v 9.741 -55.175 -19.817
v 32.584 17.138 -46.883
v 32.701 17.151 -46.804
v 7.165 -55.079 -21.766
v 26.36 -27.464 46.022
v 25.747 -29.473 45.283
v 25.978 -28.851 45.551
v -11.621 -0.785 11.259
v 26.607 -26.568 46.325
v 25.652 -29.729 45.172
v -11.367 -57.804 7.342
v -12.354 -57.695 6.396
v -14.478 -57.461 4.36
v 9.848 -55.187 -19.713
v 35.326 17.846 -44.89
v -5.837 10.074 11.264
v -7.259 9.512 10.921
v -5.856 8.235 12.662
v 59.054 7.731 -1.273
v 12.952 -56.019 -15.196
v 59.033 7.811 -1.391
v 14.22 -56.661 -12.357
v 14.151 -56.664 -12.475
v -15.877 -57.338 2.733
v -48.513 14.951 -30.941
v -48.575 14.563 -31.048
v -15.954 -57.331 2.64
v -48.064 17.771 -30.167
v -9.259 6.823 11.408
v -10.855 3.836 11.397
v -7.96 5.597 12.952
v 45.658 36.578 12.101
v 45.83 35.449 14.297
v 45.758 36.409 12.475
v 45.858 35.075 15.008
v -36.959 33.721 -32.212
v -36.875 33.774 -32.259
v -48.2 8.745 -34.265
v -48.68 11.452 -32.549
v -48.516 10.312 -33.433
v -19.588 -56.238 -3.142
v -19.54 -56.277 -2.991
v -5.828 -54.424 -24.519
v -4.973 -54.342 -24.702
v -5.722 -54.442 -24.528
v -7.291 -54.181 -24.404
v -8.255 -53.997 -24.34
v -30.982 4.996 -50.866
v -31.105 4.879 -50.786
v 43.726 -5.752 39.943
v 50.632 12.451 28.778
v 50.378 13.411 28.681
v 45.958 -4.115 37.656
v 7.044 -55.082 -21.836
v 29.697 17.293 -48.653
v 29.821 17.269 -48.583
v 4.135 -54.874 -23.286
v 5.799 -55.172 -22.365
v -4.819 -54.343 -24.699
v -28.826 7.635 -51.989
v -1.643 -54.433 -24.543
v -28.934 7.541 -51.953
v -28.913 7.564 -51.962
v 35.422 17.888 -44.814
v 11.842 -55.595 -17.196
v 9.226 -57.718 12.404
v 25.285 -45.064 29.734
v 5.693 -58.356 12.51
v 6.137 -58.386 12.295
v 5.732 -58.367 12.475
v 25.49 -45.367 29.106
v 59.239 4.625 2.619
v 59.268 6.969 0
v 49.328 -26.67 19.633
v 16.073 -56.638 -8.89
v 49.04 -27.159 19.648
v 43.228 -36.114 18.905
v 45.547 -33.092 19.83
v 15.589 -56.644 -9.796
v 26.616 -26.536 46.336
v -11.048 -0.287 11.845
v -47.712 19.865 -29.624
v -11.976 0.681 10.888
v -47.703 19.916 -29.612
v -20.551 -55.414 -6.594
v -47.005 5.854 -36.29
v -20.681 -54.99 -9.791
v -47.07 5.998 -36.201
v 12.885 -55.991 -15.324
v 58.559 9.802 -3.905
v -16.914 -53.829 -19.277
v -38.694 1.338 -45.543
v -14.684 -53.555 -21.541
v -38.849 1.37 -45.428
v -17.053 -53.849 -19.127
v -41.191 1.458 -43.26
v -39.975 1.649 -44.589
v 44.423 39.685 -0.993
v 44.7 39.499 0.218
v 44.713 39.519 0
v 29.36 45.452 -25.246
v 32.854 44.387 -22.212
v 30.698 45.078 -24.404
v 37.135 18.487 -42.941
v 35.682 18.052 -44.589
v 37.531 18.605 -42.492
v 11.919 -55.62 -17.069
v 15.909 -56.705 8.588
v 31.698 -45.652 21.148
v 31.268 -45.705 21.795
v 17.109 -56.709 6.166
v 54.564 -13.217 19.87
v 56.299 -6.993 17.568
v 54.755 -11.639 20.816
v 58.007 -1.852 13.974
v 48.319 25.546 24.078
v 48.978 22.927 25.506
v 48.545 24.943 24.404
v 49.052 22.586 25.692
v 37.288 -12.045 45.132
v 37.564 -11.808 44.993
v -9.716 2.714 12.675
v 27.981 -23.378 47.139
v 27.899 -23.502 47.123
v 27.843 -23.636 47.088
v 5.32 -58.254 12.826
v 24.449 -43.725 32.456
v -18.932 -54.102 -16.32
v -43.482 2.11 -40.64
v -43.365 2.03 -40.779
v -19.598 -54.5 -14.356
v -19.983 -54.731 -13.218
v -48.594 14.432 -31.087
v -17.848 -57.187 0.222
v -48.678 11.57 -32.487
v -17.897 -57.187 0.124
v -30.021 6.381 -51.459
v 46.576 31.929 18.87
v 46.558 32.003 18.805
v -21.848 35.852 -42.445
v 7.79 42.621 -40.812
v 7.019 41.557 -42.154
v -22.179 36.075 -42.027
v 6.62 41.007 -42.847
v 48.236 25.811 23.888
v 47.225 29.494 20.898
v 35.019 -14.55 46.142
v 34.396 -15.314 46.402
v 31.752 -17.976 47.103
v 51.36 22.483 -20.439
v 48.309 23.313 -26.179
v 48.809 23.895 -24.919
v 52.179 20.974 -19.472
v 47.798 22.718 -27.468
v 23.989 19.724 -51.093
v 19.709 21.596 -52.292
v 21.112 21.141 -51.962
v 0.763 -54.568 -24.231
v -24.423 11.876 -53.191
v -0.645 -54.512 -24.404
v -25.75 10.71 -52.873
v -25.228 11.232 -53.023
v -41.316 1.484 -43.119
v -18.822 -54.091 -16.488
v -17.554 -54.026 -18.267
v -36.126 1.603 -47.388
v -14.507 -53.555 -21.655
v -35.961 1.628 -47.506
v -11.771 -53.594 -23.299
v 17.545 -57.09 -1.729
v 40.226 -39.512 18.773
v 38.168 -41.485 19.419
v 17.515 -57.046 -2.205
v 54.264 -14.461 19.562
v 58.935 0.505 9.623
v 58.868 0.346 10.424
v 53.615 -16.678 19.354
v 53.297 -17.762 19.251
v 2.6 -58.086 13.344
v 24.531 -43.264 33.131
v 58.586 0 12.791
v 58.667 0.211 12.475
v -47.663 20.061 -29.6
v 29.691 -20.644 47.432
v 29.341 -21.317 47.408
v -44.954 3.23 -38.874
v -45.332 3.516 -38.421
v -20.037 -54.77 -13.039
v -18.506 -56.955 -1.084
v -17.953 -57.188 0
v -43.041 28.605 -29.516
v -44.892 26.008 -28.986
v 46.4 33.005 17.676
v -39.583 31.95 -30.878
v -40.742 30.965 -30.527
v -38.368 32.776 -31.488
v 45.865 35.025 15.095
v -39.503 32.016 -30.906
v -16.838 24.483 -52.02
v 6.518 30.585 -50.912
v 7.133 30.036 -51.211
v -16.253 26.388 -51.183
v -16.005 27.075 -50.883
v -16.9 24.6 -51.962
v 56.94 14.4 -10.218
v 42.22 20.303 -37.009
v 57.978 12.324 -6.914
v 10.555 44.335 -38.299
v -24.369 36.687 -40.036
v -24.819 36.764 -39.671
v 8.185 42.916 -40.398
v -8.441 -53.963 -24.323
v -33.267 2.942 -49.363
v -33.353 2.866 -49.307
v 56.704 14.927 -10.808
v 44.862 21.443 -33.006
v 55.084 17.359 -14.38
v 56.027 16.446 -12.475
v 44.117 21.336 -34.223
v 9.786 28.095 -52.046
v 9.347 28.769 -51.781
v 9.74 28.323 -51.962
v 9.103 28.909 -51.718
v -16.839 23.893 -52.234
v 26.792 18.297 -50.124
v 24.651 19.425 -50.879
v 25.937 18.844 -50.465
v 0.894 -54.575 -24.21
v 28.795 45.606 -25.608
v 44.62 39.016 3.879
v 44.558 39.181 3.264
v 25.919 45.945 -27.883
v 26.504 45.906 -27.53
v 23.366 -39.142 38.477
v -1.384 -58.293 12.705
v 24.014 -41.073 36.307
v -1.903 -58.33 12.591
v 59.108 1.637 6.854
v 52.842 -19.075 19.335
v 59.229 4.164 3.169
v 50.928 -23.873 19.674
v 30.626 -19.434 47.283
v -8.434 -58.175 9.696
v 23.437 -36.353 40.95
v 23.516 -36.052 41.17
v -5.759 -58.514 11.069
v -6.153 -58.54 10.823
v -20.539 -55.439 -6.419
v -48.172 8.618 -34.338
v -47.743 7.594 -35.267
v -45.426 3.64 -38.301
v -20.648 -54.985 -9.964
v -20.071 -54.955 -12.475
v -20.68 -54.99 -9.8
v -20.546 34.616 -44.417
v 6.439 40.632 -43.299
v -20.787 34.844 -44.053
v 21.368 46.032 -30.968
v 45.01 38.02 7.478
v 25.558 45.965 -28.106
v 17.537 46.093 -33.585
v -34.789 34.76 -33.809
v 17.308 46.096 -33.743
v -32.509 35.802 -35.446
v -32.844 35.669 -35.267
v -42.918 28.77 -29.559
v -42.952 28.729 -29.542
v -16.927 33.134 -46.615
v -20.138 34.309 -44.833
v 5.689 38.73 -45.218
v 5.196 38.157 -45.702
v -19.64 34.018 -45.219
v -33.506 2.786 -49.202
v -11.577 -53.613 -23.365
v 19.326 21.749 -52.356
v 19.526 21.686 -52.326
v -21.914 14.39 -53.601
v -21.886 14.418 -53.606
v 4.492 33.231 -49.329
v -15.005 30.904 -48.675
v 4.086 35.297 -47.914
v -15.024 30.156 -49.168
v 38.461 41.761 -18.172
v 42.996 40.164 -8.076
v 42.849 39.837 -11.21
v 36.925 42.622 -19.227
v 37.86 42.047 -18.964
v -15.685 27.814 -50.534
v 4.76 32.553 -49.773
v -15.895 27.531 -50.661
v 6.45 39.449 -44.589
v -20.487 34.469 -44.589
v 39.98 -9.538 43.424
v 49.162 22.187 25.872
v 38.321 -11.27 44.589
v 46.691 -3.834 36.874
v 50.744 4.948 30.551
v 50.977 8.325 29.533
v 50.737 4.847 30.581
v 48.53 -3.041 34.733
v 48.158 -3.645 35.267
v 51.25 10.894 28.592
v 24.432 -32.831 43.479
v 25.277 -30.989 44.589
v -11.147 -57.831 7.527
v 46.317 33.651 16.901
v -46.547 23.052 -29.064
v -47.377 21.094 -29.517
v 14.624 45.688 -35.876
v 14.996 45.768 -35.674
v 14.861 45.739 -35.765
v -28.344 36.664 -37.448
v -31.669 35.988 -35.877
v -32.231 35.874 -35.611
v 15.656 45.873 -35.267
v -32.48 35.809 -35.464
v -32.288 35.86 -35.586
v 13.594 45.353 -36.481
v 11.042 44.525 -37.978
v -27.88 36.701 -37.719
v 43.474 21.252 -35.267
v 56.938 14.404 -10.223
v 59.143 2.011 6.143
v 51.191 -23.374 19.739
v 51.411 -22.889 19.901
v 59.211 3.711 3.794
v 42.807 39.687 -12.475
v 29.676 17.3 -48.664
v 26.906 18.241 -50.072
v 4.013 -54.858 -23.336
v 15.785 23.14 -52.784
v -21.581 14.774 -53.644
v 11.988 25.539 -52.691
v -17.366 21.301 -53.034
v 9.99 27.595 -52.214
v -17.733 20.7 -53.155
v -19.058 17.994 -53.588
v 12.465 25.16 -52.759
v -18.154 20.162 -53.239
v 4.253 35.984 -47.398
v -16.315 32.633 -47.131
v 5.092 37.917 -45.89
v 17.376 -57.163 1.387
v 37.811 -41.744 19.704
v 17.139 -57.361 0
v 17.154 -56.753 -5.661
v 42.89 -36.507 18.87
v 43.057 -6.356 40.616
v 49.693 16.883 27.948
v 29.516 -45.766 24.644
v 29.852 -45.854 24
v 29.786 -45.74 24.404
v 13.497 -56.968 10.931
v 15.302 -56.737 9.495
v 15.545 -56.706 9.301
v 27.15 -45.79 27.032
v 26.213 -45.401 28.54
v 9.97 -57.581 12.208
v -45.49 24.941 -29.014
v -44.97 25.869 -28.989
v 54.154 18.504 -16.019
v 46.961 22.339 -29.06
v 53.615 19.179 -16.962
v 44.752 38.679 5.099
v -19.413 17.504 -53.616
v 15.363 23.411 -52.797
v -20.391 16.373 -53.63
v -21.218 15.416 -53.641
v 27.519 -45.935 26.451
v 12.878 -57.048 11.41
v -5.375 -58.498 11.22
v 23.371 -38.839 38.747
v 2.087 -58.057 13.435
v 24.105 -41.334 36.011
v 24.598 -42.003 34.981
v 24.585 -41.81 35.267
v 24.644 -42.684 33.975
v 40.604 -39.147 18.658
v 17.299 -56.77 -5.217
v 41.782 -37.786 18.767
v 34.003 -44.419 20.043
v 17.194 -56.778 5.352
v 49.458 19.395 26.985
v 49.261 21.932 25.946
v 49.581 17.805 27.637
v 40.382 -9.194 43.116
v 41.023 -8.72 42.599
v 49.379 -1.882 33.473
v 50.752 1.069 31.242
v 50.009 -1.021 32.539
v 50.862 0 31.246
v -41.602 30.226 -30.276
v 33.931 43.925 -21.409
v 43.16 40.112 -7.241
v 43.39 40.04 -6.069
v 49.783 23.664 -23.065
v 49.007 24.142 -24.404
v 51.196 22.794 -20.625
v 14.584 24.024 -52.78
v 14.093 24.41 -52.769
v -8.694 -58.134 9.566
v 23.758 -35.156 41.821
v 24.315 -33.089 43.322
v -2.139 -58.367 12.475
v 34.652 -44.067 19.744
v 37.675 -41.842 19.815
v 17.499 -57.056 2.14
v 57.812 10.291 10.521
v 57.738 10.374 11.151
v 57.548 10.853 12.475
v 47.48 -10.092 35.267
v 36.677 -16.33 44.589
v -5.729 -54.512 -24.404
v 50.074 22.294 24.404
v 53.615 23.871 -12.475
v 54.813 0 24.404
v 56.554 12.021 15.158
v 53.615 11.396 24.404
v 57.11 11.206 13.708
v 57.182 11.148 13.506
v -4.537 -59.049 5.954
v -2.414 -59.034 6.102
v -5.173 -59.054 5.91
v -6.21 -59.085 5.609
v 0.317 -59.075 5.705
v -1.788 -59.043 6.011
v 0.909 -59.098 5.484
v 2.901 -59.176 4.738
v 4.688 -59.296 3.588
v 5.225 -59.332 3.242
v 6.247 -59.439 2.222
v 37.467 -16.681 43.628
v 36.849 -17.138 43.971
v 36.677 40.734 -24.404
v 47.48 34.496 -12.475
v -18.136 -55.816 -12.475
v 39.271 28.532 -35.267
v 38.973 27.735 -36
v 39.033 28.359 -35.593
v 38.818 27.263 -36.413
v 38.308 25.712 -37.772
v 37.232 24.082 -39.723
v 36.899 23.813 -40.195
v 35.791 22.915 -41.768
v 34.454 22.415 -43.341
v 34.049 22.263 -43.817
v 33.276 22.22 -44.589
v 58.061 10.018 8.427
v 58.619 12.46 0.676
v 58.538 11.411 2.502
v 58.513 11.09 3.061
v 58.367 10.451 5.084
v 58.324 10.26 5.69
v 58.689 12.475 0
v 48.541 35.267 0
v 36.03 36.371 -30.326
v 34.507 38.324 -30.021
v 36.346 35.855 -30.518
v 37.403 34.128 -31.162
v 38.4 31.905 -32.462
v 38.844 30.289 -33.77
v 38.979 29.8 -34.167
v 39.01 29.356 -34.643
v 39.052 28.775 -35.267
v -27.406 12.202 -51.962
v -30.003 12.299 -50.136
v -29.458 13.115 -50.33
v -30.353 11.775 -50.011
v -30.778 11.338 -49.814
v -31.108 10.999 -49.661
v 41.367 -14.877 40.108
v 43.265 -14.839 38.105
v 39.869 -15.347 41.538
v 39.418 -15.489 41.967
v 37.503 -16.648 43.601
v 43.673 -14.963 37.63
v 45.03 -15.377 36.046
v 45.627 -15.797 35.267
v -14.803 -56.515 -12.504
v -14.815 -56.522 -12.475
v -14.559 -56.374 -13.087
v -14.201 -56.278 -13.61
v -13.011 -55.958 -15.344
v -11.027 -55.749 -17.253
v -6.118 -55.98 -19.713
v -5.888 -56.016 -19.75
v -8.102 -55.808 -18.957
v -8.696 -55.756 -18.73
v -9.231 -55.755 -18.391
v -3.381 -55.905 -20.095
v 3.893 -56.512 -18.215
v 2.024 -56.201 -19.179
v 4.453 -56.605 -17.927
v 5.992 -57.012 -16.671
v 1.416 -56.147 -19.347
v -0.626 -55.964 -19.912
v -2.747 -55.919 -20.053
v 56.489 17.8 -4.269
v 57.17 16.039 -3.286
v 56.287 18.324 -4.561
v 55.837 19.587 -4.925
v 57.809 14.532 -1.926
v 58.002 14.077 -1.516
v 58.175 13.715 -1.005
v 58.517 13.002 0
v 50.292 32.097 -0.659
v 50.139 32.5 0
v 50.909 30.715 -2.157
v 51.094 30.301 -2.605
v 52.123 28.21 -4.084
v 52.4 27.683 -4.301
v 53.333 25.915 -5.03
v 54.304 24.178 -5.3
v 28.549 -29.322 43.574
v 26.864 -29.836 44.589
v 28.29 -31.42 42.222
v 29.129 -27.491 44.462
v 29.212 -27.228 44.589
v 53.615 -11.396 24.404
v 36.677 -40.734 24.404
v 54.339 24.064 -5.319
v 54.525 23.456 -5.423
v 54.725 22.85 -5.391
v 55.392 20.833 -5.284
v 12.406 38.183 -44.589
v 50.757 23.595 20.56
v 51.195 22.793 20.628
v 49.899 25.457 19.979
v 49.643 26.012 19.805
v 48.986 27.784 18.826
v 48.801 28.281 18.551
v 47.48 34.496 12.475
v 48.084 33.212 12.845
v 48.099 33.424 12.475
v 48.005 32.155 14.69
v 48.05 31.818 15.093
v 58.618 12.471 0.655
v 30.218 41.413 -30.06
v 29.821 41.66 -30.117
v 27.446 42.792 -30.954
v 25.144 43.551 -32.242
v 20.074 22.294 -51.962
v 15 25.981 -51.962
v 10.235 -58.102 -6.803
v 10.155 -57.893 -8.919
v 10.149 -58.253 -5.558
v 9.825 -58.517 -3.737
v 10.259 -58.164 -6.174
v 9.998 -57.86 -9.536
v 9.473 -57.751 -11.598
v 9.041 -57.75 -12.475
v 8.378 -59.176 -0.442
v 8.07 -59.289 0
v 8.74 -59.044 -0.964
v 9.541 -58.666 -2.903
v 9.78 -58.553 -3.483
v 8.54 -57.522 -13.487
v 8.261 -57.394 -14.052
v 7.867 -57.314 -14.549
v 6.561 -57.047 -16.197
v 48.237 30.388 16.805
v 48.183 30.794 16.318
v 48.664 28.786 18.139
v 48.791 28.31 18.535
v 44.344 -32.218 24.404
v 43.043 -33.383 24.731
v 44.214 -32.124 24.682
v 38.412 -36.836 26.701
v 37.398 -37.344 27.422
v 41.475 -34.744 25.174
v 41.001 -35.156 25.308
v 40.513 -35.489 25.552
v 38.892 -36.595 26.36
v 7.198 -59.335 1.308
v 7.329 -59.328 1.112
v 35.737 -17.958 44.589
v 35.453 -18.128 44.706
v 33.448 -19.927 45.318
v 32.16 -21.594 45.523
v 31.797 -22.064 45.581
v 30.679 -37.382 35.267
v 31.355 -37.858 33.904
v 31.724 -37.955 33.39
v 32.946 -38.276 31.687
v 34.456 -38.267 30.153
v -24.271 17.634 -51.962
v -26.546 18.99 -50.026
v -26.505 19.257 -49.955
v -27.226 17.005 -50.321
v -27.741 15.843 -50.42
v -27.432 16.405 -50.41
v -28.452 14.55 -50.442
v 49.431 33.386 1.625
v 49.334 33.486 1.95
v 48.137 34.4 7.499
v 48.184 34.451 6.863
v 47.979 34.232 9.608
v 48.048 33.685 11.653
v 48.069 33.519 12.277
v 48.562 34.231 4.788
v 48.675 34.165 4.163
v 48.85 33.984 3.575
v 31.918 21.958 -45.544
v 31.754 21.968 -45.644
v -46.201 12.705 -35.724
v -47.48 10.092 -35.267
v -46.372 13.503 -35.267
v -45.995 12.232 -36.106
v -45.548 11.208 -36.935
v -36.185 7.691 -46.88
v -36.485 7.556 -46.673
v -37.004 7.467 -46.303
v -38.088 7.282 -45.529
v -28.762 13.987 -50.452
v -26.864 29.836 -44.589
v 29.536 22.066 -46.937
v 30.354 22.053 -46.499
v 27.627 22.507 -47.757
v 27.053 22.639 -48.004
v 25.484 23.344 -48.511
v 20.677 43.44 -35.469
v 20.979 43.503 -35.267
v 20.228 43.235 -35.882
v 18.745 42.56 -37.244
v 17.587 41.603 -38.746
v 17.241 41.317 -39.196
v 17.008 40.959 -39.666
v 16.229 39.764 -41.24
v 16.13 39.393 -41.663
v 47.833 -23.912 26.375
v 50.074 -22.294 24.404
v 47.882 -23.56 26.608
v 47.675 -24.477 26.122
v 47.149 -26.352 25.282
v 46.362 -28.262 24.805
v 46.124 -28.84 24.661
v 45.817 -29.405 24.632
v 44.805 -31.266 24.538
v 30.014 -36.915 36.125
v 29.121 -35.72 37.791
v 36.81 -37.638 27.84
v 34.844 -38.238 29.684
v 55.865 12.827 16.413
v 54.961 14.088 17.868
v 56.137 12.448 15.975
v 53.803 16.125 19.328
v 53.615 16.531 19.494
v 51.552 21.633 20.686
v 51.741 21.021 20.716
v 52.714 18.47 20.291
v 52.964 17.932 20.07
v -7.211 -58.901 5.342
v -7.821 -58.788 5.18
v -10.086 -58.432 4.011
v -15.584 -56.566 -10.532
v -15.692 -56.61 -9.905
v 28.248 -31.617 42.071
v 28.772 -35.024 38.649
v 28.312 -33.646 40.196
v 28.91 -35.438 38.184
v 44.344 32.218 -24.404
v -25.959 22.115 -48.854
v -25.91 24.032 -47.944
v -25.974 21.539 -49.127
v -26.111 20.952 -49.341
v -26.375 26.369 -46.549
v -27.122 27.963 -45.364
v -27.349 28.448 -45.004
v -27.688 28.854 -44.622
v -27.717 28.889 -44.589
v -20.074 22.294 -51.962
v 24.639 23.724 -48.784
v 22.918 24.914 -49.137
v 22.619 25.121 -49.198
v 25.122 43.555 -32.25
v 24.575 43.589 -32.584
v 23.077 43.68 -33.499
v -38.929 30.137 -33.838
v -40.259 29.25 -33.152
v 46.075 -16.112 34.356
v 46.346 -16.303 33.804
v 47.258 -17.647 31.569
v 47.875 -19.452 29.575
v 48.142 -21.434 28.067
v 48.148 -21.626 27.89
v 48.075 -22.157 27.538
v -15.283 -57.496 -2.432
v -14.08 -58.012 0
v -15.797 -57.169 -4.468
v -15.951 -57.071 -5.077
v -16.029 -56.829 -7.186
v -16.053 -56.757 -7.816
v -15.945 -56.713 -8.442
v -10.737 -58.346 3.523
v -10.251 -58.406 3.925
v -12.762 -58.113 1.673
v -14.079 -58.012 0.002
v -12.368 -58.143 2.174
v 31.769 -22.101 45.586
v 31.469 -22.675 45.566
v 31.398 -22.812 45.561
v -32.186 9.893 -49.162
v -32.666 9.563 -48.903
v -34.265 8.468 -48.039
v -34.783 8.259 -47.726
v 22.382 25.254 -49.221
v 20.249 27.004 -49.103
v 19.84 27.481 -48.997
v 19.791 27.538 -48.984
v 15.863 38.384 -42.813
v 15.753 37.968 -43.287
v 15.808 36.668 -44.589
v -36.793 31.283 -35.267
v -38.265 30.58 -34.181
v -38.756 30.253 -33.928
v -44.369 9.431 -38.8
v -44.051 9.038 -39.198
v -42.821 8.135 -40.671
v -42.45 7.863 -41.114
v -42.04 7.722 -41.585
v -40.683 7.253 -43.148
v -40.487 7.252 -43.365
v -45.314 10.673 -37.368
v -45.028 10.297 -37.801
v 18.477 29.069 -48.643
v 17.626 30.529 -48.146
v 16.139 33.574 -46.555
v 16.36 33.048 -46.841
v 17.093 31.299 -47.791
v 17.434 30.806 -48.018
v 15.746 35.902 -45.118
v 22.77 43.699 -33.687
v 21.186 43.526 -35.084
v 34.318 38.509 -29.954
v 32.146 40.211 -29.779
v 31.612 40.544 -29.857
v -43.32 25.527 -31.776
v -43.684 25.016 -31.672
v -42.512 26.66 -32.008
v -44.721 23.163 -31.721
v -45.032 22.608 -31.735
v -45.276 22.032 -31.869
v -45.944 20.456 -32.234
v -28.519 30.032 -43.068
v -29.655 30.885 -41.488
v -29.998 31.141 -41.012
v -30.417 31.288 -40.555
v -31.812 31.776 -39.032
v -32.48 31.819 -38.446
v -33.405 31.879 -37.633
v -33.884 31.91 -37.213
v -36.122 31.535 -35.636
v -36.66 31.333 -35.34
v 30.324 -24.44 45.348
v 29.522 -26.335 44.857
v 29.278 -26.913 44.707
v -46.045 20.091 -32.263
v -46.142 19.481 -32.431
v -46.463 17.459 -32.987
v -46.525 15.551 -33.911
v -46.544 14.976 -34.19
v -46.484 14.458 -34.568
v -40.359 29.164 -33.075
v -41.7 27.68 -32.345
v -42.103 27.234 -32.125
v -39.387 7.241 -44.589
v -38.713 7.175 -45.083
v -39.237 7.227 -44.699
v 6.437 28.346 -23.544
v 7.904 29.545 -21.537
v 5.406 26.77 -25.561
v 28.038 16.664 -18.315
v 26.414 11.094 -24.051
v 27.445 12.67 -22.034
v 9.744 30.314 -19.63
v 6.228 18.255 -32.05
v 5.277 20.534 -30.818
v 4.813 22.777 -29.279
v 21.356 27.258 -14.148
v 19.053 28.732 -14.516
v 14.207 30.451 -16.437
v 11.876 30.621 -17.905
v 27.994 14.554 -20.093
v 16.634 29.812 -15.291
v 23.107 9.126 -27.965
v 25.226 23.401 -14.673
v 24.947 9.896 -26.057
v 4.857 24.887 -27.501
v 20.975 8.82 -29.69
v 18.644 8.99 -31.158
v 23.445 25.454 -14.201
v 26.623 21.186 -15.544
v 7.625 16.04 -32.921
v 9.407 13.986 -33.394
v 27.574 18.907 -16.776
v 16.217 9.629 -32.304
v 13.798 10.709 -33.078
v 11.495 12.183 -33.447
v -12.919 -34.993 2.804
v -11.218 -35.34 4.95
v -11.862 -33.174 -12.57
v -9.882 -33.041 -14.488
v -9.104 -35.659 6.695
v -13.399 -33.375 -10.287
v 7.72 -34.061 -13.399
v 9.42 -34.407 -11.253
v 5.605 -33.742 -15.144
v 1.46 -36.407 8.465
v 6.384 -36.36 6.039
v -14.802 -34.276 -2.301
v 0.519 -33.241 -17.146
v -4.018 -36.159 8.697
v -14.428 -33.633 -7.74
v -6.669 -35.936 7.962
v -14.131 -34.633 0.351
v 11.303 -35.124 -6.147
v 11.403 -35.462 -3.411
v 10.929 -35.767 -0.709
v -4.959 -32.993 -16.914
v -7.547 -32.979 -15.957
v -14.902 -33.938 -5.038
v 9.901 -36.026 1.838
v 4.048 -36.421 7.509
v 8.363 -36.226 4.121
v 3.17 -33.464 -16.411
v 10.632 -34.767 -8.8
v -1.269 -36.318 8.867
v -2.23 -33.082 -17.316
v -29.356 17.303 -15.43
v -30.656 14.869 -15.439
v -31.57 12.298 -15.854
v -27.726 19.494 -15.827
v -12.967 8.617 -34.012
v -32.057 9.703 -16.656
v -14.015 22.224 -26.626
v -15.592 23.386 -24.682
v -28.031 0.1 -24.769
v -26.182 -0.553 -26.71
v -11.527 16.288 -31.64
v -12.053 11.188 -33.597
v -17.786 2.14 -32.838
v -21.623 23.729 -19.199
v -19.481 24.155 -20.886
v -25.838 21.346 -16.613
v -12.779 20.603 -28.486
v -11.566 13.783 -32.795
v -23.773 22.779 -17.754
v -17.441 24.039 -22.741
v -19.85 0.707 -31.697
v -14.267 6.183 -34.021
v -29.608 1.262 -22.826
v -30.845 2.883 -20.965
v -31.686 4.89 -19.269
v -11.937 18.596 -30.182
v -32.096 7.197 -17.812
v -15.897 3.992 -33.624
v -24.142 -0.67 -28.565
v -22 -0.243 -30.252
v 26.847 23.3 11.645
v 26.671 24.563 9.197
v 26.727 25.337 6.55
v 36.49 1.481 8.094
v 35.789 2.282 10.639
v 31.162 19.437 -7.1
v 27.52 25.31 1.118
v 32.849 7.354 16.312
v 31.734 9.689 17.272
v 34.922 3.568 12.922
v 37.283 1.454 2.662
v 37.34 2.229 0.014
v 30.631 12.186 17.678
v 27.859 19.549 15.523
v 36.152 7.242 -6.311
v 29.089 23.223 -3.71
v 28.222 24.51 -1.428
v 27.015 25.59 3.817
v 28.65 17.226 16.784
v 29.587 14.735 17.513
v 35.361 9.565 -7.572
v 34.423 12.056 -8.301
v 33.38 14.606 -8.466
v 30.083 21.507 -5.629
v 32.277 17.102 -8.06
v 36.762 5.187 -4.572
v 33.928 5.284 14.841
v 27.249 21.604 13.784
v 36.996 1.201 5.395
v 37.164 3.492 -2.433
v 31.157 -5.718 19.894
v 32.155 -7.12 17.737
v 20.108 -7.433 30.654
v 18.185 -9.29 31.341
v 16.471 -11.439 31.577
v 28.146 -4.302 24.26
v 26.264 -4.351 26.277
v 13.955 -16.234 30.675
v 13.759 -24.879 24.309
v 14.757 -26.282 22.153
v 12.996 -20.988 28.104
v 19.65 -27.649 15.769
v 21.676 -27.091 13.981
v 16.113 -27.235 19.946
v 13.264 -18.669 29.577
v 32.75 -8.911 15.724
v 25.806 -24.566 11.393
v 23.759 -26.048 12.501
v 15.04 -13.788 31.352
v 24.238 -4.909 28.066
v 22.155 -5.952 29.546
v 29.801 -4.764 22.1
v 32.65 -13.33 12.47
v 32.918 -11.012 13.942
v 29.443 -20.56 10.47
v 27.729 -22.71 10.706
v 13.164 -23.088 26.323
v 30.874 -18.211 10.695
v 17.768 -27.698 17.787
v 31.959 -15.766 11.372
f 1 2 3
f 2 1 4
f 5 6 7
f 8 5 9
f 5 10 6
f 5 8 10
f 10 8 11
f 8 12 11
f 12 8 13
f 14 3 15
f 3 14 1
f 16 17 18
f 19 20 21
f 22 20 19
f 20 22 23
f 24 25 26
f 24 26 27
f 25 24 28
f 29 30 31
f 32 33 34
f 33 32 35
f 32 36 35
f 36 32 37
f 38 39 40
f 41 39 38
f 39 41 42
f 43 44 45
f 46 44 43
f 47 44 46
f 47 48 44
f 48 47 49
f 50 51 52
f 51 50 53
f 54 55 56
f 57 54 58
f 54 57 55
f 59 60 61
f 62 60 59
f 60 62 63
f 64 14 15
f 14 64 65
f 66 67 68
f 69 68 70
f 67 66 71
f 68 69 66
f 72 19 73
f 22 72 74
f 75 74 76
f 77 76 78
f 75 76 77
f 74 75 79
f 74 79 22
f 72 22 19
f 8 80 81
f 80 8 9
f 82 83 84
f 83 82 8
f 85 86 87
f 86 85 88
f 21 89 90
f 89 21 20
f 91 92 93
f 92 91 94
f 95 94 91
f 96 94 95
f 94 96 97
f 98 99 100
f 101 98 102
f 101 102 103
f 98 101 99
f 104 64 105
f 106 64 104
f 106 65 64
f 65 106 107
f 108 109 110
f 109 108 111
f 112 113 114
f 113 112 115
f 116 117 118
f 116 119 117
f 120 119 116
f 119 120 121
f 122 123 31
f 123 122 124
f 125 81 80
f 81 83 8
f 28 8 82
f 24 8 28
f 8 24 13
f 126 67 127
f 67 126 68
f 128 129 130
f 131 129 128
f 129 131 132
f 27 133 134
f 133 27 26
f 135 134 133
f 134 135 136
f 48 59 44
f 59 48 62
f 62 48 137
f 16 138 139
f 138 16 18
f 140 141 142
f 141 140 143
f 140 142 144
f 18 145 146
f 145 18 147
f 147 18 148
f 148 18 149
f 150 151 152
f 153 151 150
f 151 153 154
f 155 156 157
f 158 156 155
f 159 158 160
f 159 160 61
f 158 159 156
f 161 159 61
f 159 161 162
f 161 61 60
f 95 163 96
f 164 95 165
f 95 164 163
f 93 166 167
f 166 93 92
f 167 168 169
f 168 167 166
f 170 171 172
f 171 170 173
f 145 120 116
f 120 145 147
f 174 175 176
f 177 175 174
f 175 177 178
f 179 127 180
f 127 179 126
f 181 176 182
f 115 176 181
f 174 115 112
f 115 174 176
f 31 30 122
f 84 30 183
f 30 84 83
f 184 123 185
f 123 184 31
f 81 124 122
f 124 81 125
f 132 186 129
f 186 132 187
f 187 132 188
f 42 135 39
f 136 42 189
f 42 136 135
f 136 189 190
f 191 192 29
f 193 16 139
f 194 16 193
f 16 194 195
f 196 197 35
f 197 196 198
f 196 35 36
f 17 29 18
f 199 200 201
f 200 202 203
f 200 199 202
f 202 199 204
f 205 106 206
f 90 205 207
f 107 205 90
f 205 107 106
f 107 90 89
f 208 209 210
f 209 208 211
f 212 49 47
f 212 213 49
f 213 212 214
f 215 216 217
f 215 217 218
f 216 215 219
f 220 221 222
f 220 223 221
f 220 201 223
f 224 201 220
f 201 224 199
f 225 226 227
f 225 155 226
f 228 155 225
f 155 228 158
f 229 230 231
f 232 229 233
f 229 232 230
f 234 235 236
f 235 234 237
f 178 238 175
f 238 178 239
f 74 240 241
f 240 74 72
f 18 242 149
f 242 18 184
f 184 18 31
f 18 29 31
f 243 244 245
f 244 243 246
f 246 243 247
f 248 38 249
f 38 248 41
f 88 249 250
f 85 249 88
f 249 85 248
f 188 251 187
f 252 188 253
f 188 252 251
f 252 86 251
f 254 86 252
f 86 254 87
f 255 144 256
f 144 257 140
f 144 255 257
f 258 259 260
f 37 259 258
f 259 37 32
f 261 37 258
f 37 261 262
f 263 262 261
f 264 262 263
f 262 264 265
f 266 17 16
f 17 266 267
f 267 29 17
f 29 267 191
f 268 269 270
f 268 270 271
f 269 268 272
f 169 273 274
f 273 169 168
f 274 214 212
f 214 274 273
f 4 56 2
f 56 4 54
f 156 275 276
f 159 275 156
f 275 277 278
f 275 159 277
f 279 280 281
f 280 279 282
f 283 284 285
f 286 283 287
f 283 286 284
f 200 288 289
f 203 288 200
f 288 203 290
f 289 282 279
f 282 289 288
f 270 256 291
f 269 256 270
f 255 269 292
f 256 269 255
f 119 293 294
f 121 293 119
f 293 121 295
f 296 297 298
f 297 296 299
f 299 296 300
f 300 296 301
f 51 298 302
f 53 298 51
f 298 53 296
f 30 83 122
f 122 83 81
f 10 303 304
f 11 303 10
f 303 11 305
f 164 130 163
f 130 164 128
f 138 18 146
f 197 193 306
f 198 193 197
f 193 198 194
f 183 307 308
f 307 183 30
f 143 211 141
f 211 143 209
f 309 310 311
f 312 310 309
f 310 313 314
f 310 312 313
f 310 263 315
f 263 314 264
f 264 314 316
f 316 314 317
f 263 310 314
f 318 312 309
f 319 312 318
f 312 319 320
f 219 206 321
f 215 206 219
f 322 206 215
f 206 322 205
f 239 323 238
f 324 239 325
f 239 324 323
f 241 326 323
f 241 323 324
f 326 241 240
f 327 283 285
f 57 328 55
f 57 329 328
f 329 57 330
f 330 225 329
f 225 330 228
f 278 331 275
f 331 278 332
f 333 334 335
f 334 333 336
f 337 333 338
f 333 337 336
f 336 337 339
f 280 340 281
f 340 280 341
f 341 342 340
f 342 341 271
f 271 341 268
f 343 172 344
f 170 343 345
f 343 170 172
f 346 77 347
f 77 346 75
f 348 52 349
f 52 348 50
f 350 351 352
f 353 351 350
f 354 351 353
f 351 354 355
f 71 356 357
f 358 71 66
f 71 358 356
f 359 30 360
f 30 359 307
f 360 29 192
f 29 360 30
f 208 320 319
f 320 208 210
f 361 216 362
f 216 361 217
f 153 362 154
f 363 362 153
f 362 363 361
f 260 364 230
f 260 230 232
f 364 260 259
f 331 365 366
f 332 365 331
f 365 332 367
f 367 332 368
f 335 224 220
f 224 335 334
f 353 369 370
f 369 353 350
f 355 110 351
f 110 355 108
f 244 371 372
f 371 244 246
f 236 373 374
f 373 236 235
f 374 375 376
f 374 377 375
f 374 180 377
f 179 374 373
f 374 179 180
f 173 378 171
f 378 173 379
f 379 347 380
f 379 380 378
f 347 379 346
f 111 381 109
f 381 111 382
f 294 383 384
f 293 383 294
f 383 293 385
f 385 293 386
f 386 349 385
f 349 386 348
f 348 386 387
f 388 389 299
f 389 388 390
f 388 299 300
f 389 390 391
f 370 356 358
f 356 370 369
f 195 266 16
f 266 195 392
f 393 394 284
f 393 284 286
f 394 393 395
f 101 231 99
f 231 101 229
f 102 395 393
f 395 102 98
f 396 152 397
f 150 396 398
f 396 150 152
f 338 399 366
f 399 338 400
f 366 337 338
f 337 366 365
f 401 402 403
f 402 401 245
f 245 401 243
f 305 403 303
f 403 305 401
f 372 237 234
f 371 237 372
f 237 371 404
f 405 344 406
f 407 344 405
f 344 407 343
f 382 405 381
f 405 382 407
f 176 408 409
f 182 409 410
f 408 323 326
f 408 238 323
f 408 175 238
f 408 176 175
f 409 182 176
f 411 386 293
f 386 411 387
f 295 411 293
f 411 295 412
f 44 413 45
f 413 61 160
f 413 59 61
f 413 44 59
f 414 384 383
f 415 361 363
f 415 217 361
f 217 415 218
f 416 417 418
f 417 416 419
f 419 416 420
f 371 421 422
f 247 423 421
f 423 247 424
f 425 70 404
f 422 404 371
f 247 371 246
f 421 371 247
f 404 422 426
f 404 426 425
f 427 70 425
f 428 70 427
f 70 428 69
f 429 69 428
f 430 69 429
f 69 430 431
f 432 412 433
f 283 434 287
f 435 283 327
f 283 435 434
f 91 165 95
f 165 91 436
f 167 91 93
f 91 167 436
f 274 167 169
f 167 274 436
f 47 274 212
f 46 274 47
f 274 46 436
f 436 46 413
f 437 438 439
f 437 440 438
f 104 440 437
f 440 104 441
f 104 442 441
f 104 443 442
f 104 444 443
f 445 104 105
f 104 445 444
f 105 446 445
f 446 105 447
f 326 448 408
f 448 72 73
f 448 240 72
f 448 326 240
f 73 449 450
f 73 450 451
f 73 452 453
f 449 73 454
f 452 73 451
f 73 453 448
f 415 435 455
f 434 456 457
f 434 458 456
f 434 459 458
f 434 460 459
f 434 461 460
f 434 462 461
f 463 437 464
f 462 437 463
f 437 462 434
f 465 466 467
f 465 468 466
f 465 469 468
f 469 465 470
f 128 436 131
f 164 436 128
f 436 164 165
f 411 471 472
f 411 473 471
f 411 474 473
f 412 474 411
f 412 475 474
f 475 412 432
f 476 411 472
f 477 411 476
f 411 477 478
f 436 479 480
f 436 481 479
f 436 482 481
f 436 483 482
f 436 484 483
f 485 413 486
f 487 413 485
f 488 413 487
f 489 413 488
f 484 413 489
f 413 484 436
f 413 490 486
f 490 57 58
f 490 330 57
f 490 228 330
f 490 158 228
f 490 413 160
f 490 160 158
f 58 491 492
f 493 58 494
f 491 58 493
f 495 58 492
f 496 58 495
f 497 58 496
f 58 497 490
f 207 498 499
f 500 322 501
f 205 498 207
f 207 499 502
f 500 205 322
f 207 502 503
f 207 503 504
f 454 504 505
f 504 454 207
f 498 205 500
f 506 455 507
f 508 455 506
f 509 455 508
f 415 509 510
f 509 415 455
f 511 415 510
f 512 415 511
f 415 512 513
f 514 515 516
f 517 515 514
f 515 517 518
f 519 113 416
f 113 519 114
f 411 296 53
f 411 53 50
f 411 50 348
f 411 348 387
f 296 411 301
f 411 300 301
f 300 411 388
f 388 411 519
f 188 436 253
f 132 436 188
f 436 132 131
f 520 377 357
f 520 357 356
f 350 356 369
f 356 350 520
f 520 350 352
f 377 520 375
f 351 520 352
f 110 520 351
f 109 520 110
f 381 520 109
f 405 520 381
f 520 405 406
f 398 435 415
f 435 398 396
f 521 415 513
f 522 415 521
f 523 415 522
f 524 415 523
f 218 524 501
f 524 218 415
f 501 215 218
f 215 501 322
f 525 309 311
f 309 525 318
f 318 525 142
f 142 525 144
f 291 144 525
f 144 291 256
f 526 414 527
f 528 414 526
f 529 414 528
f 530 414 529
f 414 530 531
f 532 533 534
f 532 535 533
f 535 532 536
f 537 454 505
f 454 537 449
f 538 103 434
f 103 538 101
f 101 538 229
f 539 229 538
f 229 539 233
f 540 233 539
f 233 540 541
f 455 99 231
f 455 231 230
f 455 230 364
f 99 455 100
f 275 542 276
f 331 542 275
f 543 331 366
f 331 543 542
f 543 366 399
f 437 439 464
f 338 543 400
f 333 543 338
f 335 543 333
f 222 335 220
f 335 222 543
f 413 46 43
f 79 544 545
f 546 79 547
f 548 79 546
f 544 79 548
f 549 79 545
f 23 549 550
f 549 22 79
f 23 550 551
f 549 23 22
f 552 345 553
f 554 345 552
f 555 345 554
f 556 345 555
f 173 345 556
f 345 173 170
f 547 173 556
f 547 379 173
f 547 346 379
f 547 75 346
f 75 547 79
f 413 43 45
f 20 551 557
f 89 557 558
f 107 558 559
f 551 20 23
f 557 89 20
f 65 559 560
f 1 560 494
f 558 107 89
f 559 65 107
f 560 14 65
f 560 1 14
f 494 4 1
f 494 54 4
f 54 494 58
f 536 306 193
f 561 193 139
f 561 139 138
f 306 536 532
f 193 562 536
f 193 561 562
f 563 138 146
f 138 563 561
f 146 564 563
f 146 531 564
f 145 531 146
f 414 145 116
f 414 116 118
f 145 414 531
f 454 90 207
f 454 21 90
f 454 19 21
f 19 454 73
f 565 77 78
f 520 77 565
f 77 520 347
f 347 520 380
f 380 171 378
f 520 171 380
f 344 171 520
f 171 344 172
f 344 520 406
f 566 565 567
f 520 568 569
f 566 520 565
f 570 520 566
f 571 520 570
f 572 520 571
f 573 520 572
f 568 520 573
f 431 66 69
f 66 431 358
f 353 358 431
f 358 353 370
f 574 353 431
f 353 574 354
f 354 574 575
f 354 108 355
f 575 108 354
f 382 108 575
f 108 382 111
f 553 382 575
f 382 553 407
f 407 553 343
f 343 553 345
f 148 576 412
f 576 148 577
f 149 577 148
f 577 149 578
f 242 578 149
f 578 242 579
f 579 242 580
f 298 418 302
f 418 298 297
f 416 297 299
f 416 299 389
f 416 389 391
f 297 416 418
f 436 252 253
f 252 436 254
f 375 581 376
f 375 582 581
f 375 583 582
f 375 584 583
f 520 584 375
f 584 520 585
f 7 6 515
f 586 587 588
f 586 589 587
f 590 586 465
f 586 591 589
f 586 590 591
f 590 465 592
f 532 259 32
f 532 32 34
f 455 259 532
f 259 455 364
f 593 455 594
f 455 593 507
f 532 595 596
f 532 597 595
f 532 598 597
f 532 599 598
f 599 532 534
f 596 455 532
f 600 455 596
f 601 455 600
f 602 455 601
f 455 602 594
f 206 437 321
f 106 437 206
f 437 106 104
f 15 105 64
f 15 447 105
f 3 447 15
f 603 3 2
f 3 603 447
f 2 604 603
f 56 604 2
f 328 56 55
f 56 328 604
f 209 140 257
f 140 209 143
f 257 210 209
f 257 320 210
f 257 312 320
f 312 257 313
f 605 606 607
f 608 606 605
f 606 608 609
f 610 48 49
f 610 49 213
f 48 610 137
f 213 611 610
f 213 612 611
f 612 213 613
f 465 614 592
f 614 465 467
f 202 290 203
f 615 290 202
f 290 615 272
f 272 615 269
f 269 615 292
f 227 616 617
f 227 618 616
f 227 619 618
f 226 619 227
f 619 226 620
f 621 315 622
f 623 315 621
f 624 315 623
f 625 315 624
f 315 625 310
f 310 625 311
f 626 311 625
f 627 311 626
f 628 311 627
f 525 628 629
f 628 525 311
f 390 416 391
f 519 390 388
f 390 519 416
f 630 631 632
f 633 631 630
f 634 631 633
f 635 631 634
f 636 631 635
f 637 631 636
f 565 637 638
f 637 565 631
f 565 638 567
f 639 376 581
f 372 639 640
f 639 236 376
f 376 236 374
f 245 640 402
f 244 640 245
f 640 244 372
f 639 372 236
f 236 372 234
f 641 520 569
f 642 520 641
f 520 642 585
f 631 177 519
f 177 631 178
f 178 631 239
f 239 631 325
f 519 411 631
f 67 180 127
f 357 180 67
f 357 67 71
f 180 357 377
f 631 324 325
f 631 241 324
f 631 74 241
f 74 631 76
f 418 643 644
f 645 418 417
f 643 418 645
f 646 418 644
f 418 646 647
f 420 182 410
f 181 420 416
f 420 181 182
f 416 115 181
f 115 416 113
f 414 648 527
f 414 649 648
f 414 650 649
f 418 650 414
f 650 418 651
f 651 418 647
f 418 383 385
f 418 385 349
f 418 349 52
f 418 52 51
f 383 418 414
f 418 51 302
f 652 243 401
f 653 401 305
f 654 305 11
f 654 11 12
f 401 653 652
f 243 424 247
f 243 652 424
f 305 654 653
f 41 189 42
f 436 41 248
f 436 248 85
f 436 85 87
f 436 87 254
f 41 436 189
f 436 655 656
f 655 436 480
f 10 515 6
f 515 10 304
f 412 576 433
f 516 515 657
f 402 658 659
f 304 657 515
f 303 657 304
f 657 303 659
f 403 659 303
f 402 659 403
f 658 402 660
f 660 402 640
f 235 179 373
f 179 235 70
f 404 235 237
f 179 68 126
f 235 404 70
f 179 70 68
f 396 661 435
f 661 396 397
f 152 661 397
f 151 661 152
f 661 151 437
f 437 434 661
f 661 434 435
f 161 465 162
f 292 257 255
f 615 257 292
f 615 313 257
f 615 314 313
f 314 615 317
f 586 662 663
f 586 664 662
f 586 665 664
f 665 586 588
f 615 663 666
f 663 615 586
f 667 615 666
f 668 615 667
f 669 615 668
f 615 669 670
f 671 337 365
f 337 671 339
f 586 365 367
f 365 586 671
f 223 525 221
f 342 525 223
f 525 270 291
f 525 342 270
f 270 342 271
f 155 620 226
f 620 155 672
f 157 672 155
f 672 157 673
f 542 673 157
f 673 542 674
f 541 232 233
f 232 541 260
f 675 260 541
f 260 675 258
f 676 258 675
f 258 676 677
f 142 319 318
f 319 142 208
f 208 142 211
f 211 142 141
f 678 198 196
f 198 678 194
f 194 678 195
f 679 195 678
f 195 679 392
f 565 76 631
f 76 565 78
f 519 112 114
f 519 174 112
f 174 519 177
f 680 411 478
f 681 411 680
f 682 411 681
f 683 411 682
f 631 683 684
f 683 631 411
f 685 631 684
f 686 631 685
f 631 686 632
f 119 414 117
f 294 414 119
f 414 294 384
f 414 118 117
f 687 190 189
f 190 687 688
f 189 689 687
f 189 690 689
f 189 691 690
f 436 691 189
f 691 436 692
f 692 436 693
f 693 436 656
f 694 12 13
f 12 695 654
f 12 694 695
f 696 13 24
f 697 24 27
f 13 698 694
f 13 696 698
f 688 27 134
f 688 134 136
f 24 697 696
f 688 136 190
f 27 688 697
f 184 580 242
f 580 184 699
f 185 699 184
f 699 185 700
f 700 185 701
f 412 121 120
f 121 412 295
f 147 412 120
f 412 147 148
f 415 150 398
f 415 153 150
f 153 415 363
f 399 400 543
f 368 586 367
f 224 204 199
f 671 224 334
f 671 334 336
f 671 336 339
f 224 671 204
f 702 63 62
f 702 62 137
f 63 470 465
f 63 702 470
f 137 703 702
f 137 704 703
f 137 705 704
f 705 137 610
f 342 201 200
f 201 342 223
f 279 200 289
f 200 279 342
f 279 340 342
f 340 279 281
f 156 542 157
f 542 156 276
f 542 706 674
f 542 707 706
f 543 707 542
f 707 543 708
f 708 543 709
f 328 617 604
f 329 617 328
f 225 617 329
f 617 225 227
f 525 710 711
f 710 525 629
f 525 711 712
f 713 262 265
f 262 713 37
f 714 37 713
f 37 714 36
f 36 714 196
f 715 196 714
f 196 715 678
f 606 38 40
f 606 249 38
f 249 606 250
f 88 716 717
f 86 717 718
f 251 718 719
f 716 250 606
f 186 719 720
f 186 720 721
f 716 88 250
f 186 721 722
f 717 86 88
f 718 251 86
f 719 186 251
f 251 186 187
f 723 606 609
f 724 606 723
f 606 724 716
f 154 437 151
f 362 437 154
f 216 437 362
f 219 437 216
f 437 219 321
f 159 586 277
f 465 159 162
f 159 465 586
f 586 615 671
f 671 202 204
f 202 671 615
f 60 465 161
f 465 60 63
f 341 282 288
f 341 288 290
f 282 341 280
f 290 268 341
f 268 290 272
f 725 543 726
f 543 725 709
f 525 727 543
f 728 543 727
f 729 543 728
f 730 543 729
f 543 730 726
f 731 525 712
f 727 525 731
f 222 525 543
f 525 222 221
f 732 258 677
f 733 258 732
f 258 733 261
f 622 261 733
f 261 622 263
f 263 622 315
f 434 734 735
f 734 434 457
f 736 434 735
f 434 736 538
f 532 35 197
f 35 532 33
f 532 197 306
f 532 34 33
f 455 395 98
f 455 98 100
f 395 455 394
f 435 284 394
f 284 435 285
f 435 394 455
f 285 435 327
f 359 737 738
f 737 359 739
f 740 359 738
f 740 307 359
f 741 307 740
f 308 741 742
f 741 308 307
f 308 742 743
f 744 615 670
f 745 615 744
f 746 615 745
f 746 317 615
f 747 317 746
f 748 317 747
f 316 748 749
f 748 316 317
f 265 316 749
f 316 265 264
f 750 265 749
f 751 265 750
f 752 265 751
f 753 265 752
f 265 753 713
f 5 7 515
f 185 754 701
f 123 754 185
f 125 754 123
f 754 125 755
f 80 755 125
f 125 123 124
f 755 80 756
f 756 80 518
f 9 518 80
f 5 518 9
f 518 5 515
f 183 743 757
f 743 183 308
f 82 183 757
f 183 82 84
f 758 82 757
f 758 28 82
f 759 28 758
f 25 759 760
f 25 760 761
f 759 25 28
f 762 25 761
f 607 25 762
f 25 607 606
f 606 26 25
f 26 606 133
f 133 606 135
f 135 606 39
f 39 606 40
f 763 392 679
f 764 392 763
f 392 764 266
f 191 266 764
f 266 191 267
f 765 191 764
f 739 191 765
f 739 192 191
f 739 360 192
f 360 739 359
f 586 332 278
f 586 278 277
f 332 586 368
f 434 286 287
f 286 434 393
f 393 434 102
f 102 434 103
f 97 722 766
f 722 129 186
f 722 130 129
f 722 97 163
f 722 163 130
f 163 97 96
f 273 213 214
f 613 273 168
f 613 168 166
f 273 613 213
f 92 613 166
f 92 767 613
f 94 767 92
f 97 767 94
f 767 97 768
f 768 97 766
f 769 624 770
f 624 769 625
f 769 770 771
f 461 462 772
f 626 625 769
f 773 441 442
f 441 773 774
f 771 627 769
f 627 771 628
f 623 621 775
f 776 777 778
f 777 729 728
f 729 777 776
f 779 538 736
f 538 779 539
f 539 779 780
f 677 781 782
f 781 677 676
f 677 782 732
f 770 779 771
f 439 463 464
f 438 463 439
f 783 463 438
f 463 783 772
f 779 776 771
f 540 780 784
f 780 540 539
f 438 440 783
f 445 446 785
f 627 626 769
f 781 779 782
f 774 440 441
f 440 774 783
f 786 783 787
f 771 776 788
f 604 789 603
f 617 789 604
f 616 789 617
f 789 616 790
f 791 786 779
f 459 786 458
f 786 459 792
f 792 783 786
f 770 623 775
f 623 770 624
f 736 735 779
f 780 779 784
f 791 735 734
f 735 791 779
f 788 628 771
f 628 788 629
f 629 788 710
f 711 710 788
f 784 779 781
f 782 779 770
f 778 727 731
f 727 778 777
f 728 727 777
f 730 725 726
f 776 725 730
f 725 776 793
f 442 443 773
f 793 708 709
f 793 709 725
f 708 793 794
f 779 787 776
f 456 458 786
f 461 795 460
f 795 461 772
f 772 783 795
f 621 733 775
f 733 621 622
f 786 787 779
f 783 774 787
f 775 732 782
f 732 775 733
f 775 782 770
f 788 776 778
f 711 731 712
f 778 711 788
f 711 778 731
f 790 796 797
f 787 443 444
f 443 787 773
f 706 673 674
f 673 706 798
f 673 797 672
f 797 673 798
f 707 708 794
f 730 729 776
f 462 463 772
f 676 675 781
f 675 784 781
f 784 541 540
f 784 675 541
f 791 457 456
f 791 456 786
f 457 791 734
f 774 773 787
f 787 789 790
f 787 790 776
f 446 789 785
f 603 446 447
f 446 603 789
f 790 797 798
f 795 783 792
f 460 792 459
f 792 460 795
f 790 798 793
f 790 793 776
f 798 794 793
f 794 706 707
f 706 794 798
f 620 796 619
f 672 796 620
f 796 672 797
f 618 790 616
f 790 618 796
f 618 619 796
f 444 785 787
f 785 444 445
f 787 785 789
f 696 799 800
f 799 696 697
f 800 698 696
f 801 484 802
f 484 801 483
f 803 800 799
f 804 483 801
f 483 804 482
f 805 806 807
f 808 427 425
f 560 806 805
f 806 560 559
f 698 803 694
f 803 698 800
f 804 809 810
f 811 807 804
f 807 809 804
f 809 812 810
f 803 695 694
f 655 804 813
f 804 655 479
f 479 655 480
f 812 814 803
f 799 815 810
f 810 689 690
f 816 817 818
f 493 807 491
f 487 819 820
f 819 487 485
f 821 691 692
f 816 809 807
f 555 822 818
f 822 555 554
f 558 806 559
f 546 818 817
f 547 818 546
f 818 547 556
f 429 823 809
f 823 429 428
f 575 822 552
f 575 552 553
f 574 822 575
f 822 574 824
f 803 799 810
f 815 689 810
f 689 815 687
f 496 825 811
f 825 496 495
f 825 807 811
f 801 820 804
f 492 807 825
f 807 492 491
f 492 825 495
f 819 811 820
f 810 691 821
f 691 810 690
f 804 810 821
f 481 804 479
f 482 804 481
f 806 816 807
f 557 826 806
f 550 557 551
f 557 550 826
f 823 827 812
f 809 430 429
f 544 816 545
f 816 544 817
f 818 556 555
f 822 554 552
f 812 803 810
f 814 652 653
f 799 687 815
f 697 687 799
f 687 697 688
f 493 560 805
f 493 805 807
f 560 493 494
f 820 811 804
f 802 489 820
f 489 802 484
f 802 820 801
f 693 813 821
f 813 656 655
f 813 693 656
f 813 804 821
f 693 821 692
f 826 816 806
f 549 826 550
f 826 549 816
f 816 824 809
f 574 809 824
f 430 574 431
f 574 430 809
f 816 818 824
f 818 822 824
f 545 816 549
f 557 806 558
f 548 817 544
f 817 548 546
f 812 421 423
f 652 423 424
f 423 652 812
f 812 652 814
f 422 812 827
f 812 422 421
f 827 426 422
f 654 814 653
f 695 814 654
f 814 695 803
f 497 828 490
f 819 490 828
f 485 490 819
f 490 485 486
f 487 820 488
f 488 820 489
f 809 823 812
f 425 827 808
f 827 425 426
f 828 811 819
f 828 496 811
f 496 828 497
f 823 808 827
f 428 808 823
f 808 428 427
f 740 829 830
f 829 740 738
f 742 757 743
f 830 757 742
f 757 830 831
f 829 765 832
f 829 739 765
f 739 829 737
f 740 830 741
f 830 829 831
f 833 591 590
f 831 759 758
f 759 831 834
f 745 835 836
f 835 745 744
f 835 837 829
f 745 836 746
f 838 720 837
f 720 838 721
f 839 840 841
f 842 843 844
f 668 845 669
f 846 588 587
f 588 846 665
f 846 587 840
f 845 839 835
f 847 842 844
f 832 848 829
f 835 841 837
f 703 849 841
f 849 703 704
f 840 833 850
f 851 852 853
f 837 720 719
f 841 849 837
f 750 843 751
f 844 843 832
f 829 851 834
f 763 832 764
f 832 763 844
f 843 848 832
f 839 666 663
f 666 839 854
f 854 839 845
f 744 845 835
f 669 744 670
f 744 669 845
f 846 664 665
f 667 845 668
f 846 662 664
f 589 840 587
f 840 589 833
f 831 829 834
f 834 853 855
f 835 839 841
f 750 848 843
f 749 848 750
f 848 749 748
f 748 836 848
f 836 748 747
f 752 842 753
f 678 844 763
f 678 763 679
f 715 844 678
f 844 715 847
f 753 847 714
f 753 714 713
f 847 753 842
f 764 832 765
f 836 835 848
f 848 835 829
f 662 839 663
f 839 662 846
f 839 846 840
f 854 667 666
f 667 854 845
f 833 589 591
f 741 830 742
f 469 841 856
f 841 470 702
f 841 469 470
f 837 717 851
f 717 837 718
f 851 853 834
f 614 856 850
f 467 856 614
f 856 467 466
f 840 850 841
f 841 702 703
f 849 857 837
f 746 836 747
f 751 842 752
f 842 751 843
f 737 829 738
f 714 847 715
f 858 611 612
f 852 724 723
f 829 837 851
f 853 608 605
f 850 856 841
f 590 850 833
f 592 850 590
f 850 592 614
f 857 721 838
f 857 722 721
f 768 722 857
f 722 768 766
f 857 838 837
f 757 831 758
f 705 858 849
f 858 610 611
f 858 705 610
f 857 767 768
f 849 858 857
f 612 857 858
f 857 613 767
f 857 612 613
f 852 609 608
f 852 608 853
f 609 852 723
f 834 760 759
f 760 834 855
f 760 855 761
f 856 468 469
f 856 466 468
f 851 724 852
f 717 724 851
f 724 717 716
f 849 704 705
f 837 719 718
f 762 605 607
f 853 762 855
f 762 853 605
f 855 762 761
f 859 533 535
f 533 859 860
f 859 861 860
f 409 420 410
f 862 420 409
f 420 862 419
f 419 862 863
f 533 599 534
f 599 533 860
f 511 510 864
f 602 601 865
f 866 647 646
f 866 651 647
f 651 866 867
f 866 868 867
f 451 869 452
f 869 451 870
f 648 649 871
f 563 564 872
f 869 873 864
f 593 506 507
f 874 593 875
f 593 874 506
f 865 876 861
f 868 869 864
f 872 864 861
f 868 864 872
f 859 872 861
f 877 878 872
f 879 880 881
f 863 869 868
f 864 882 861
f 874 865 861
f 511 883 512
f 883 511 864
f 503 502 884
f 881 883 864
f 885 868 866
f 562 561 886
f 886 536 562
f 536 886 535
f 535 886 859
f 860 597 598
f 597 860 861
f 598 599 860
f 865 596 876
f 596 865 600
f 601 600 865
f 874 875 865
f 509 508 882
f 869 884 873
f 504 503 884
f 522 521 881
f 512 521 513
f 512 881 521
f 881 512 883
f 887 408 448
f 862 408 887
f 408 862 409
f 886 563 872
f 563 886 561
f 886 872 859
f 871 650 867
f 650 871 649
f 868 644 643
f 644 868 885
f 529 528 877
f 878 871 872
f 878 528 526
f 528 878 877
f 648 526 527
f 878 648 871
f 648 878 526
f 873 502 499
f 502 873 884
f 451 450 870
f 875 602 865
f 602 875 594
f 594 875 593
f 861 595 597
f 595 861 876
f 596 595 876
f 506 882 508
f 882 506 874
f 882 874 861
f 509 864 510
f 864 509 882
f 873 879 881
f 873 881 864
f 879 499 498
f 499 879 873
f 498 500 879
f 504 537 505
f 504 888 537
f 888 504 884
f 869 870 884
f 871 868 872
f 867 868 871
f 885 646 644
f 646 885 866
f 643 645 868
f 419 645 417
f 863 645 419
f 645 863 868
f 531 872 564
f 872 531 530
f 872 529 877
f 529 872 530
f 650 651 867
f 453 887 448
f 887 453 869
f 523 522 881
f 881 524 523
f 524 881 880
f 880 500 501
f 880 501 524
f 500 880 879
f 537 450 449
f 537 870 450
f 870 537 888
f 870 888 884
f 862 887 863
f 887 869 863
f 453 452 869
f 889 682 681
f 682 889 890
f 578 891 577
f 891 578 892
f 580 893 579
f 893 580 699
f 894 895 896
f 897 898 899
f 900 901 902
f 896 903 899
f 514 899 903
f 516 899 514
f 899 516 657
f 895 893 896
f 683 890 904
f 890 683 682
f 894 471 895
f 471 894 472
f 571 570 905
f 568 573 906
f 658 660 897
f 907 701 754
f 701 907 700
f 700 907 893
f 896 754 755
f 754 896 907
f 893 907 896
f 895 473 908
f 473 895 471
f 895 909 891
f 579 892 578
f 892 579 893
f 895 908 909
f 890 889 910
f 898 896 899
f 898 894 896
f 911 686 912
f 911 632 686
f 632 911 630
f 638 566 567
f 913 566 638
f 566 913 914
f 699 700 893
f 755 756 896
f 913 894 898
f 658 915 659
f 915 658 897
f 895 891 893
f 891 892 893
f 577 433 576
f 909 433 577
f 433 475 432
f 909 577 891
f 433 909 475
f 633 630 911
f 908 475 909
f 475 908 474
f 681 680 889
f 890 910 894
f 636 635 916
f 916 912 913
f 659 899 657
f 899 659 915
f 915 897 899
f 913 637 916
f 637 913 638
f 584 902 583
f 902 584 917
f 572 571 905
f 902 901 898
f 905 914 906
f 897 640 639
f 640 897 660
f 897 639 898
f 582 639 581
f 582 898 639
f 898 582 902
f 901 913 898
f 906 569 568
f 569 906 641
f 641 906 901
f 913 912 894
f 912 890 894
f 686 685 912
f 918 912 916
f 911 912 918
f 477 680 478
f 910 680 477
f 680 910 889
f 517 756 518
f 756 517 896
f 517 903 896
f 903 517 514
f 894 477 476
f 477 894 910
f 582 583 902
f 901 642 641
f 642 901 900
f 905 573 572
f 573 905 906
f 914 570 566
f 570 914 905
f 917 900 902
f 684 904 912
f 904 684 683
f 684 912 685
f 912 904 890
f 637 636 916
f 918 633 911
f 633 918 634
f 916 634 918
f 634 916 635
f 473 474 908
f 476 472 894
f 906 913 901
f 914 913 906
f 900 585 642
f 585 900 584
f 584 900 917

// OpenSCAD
difference() {
	intersection() {
		hull() {
			rotate(a = -120.3141209556, v = [0.1046496734, 0.8569046481, -0.0000000000]) {
				rotate(a = -90.0000000000, v = [0.7071067812, 0.7071067812, -0.0000000000]) {
					cylinder(h = 60, r = 16.2000000000);
				}
			}
			rotate(a = -120.3141209556, v = [0.1046496734, 0.8569046481, -0.0000000000]) {
				rotate(a = -90.0000000000, v = [-0.9659258263, 0.2588190451, 0.0000000000]) {
					cylinder(h = 60, r = 16.2000000000);
				}
			}
			rotate(a = -120.3141209556, v = [0.1046496734, 0.8569046481, -0.0000000000]) {
				rotate(a = -22.2263282801, v = [0.2891837505, 0.2438402662, -0.0000000000]) {
					cylinder(h = 60, r = 16.2000000000);
				}
			}
			rotate(a = -120.3141209556, v = [0.1046496734, 0.8569046481, -0.0000000000]) {
				rotate(a = -144.0917087294, v = [0.5260711787, 0.2592665282, -0.0000000000]) {
					cylinder(h = 60, r = 16.2000000000);
				}
			}
			rotate(a = -120.3141209556, v = [0.1046496734, 0.8569046481, -0.0000000000]) {
				rotate(a = -155.9342565737, v = [-0.3911208660, -0.1153809290, 0.0000000000]) {
					cylinder(h = 60, r = 16.2000000000);
				}
			}
		}
		sphere(r = 60);
	}
	union() {
		rotate(a = -120.3141209556, v = [0.1046496734, 0.8569046481, -0.0000000000]) {
			rotate(a = -90.0000000000, v = [0.7071067812, 0.7071067812, -0.0000000000]) {
				translate(v = [0, 0, 35]) {
					cylinder(h = 100, r = 13.2000000000);
				}
			}
		}
		rotate(a = -120.3141209556, v = [0.1046496734, 0.8569046481, -0.0000000000]) {
			rotate(a = -90.0000000000, v = [-0.9659258263, 0.2588190451, 0.0000000000]) {
				translate(v = [0, 0, 35]) {
					cylinder(h = 100, r = 13.2000000000);
				}
			}
		}
		rotate(a = -120.3141209556, v = [0.1046496734, 0.8569046481, -0.0000000000]) {
			rotate(a = -22.2263282801, v = [0.2891837505, 0.2438402662, -0.0000000000]) {
				translate(v = [0, 0, 35]) {
					cylinder(h = 100, r = 13.2000000000);
				}
			}
		}
		rotate(a = -120.3141209556, v = [0.1046496734, 0.8569046481, -0.0000000000]) {
			rotate(a = -144.0917087294, v = [0.5260711787, 0.2592665282, -0.0000000000]) {
				translate(v = [0, 0, 35]) {
					cylinder(h = 100, r = 13.2000000000);
				}
			}
		}
		rotate(a = -120.3141209556, v = [0.1046496734, 0.8569046481, -0.0000000000]) {
			rotate(a = -155.9342565737, v = [-0.3911208660, -0.1153809290, 0.0000000000]) {
				translate(v = [0, 0, 35]) {
					cylinder(h = 100, r = 13.2000000000);
				}
			}
		}
	}
}
